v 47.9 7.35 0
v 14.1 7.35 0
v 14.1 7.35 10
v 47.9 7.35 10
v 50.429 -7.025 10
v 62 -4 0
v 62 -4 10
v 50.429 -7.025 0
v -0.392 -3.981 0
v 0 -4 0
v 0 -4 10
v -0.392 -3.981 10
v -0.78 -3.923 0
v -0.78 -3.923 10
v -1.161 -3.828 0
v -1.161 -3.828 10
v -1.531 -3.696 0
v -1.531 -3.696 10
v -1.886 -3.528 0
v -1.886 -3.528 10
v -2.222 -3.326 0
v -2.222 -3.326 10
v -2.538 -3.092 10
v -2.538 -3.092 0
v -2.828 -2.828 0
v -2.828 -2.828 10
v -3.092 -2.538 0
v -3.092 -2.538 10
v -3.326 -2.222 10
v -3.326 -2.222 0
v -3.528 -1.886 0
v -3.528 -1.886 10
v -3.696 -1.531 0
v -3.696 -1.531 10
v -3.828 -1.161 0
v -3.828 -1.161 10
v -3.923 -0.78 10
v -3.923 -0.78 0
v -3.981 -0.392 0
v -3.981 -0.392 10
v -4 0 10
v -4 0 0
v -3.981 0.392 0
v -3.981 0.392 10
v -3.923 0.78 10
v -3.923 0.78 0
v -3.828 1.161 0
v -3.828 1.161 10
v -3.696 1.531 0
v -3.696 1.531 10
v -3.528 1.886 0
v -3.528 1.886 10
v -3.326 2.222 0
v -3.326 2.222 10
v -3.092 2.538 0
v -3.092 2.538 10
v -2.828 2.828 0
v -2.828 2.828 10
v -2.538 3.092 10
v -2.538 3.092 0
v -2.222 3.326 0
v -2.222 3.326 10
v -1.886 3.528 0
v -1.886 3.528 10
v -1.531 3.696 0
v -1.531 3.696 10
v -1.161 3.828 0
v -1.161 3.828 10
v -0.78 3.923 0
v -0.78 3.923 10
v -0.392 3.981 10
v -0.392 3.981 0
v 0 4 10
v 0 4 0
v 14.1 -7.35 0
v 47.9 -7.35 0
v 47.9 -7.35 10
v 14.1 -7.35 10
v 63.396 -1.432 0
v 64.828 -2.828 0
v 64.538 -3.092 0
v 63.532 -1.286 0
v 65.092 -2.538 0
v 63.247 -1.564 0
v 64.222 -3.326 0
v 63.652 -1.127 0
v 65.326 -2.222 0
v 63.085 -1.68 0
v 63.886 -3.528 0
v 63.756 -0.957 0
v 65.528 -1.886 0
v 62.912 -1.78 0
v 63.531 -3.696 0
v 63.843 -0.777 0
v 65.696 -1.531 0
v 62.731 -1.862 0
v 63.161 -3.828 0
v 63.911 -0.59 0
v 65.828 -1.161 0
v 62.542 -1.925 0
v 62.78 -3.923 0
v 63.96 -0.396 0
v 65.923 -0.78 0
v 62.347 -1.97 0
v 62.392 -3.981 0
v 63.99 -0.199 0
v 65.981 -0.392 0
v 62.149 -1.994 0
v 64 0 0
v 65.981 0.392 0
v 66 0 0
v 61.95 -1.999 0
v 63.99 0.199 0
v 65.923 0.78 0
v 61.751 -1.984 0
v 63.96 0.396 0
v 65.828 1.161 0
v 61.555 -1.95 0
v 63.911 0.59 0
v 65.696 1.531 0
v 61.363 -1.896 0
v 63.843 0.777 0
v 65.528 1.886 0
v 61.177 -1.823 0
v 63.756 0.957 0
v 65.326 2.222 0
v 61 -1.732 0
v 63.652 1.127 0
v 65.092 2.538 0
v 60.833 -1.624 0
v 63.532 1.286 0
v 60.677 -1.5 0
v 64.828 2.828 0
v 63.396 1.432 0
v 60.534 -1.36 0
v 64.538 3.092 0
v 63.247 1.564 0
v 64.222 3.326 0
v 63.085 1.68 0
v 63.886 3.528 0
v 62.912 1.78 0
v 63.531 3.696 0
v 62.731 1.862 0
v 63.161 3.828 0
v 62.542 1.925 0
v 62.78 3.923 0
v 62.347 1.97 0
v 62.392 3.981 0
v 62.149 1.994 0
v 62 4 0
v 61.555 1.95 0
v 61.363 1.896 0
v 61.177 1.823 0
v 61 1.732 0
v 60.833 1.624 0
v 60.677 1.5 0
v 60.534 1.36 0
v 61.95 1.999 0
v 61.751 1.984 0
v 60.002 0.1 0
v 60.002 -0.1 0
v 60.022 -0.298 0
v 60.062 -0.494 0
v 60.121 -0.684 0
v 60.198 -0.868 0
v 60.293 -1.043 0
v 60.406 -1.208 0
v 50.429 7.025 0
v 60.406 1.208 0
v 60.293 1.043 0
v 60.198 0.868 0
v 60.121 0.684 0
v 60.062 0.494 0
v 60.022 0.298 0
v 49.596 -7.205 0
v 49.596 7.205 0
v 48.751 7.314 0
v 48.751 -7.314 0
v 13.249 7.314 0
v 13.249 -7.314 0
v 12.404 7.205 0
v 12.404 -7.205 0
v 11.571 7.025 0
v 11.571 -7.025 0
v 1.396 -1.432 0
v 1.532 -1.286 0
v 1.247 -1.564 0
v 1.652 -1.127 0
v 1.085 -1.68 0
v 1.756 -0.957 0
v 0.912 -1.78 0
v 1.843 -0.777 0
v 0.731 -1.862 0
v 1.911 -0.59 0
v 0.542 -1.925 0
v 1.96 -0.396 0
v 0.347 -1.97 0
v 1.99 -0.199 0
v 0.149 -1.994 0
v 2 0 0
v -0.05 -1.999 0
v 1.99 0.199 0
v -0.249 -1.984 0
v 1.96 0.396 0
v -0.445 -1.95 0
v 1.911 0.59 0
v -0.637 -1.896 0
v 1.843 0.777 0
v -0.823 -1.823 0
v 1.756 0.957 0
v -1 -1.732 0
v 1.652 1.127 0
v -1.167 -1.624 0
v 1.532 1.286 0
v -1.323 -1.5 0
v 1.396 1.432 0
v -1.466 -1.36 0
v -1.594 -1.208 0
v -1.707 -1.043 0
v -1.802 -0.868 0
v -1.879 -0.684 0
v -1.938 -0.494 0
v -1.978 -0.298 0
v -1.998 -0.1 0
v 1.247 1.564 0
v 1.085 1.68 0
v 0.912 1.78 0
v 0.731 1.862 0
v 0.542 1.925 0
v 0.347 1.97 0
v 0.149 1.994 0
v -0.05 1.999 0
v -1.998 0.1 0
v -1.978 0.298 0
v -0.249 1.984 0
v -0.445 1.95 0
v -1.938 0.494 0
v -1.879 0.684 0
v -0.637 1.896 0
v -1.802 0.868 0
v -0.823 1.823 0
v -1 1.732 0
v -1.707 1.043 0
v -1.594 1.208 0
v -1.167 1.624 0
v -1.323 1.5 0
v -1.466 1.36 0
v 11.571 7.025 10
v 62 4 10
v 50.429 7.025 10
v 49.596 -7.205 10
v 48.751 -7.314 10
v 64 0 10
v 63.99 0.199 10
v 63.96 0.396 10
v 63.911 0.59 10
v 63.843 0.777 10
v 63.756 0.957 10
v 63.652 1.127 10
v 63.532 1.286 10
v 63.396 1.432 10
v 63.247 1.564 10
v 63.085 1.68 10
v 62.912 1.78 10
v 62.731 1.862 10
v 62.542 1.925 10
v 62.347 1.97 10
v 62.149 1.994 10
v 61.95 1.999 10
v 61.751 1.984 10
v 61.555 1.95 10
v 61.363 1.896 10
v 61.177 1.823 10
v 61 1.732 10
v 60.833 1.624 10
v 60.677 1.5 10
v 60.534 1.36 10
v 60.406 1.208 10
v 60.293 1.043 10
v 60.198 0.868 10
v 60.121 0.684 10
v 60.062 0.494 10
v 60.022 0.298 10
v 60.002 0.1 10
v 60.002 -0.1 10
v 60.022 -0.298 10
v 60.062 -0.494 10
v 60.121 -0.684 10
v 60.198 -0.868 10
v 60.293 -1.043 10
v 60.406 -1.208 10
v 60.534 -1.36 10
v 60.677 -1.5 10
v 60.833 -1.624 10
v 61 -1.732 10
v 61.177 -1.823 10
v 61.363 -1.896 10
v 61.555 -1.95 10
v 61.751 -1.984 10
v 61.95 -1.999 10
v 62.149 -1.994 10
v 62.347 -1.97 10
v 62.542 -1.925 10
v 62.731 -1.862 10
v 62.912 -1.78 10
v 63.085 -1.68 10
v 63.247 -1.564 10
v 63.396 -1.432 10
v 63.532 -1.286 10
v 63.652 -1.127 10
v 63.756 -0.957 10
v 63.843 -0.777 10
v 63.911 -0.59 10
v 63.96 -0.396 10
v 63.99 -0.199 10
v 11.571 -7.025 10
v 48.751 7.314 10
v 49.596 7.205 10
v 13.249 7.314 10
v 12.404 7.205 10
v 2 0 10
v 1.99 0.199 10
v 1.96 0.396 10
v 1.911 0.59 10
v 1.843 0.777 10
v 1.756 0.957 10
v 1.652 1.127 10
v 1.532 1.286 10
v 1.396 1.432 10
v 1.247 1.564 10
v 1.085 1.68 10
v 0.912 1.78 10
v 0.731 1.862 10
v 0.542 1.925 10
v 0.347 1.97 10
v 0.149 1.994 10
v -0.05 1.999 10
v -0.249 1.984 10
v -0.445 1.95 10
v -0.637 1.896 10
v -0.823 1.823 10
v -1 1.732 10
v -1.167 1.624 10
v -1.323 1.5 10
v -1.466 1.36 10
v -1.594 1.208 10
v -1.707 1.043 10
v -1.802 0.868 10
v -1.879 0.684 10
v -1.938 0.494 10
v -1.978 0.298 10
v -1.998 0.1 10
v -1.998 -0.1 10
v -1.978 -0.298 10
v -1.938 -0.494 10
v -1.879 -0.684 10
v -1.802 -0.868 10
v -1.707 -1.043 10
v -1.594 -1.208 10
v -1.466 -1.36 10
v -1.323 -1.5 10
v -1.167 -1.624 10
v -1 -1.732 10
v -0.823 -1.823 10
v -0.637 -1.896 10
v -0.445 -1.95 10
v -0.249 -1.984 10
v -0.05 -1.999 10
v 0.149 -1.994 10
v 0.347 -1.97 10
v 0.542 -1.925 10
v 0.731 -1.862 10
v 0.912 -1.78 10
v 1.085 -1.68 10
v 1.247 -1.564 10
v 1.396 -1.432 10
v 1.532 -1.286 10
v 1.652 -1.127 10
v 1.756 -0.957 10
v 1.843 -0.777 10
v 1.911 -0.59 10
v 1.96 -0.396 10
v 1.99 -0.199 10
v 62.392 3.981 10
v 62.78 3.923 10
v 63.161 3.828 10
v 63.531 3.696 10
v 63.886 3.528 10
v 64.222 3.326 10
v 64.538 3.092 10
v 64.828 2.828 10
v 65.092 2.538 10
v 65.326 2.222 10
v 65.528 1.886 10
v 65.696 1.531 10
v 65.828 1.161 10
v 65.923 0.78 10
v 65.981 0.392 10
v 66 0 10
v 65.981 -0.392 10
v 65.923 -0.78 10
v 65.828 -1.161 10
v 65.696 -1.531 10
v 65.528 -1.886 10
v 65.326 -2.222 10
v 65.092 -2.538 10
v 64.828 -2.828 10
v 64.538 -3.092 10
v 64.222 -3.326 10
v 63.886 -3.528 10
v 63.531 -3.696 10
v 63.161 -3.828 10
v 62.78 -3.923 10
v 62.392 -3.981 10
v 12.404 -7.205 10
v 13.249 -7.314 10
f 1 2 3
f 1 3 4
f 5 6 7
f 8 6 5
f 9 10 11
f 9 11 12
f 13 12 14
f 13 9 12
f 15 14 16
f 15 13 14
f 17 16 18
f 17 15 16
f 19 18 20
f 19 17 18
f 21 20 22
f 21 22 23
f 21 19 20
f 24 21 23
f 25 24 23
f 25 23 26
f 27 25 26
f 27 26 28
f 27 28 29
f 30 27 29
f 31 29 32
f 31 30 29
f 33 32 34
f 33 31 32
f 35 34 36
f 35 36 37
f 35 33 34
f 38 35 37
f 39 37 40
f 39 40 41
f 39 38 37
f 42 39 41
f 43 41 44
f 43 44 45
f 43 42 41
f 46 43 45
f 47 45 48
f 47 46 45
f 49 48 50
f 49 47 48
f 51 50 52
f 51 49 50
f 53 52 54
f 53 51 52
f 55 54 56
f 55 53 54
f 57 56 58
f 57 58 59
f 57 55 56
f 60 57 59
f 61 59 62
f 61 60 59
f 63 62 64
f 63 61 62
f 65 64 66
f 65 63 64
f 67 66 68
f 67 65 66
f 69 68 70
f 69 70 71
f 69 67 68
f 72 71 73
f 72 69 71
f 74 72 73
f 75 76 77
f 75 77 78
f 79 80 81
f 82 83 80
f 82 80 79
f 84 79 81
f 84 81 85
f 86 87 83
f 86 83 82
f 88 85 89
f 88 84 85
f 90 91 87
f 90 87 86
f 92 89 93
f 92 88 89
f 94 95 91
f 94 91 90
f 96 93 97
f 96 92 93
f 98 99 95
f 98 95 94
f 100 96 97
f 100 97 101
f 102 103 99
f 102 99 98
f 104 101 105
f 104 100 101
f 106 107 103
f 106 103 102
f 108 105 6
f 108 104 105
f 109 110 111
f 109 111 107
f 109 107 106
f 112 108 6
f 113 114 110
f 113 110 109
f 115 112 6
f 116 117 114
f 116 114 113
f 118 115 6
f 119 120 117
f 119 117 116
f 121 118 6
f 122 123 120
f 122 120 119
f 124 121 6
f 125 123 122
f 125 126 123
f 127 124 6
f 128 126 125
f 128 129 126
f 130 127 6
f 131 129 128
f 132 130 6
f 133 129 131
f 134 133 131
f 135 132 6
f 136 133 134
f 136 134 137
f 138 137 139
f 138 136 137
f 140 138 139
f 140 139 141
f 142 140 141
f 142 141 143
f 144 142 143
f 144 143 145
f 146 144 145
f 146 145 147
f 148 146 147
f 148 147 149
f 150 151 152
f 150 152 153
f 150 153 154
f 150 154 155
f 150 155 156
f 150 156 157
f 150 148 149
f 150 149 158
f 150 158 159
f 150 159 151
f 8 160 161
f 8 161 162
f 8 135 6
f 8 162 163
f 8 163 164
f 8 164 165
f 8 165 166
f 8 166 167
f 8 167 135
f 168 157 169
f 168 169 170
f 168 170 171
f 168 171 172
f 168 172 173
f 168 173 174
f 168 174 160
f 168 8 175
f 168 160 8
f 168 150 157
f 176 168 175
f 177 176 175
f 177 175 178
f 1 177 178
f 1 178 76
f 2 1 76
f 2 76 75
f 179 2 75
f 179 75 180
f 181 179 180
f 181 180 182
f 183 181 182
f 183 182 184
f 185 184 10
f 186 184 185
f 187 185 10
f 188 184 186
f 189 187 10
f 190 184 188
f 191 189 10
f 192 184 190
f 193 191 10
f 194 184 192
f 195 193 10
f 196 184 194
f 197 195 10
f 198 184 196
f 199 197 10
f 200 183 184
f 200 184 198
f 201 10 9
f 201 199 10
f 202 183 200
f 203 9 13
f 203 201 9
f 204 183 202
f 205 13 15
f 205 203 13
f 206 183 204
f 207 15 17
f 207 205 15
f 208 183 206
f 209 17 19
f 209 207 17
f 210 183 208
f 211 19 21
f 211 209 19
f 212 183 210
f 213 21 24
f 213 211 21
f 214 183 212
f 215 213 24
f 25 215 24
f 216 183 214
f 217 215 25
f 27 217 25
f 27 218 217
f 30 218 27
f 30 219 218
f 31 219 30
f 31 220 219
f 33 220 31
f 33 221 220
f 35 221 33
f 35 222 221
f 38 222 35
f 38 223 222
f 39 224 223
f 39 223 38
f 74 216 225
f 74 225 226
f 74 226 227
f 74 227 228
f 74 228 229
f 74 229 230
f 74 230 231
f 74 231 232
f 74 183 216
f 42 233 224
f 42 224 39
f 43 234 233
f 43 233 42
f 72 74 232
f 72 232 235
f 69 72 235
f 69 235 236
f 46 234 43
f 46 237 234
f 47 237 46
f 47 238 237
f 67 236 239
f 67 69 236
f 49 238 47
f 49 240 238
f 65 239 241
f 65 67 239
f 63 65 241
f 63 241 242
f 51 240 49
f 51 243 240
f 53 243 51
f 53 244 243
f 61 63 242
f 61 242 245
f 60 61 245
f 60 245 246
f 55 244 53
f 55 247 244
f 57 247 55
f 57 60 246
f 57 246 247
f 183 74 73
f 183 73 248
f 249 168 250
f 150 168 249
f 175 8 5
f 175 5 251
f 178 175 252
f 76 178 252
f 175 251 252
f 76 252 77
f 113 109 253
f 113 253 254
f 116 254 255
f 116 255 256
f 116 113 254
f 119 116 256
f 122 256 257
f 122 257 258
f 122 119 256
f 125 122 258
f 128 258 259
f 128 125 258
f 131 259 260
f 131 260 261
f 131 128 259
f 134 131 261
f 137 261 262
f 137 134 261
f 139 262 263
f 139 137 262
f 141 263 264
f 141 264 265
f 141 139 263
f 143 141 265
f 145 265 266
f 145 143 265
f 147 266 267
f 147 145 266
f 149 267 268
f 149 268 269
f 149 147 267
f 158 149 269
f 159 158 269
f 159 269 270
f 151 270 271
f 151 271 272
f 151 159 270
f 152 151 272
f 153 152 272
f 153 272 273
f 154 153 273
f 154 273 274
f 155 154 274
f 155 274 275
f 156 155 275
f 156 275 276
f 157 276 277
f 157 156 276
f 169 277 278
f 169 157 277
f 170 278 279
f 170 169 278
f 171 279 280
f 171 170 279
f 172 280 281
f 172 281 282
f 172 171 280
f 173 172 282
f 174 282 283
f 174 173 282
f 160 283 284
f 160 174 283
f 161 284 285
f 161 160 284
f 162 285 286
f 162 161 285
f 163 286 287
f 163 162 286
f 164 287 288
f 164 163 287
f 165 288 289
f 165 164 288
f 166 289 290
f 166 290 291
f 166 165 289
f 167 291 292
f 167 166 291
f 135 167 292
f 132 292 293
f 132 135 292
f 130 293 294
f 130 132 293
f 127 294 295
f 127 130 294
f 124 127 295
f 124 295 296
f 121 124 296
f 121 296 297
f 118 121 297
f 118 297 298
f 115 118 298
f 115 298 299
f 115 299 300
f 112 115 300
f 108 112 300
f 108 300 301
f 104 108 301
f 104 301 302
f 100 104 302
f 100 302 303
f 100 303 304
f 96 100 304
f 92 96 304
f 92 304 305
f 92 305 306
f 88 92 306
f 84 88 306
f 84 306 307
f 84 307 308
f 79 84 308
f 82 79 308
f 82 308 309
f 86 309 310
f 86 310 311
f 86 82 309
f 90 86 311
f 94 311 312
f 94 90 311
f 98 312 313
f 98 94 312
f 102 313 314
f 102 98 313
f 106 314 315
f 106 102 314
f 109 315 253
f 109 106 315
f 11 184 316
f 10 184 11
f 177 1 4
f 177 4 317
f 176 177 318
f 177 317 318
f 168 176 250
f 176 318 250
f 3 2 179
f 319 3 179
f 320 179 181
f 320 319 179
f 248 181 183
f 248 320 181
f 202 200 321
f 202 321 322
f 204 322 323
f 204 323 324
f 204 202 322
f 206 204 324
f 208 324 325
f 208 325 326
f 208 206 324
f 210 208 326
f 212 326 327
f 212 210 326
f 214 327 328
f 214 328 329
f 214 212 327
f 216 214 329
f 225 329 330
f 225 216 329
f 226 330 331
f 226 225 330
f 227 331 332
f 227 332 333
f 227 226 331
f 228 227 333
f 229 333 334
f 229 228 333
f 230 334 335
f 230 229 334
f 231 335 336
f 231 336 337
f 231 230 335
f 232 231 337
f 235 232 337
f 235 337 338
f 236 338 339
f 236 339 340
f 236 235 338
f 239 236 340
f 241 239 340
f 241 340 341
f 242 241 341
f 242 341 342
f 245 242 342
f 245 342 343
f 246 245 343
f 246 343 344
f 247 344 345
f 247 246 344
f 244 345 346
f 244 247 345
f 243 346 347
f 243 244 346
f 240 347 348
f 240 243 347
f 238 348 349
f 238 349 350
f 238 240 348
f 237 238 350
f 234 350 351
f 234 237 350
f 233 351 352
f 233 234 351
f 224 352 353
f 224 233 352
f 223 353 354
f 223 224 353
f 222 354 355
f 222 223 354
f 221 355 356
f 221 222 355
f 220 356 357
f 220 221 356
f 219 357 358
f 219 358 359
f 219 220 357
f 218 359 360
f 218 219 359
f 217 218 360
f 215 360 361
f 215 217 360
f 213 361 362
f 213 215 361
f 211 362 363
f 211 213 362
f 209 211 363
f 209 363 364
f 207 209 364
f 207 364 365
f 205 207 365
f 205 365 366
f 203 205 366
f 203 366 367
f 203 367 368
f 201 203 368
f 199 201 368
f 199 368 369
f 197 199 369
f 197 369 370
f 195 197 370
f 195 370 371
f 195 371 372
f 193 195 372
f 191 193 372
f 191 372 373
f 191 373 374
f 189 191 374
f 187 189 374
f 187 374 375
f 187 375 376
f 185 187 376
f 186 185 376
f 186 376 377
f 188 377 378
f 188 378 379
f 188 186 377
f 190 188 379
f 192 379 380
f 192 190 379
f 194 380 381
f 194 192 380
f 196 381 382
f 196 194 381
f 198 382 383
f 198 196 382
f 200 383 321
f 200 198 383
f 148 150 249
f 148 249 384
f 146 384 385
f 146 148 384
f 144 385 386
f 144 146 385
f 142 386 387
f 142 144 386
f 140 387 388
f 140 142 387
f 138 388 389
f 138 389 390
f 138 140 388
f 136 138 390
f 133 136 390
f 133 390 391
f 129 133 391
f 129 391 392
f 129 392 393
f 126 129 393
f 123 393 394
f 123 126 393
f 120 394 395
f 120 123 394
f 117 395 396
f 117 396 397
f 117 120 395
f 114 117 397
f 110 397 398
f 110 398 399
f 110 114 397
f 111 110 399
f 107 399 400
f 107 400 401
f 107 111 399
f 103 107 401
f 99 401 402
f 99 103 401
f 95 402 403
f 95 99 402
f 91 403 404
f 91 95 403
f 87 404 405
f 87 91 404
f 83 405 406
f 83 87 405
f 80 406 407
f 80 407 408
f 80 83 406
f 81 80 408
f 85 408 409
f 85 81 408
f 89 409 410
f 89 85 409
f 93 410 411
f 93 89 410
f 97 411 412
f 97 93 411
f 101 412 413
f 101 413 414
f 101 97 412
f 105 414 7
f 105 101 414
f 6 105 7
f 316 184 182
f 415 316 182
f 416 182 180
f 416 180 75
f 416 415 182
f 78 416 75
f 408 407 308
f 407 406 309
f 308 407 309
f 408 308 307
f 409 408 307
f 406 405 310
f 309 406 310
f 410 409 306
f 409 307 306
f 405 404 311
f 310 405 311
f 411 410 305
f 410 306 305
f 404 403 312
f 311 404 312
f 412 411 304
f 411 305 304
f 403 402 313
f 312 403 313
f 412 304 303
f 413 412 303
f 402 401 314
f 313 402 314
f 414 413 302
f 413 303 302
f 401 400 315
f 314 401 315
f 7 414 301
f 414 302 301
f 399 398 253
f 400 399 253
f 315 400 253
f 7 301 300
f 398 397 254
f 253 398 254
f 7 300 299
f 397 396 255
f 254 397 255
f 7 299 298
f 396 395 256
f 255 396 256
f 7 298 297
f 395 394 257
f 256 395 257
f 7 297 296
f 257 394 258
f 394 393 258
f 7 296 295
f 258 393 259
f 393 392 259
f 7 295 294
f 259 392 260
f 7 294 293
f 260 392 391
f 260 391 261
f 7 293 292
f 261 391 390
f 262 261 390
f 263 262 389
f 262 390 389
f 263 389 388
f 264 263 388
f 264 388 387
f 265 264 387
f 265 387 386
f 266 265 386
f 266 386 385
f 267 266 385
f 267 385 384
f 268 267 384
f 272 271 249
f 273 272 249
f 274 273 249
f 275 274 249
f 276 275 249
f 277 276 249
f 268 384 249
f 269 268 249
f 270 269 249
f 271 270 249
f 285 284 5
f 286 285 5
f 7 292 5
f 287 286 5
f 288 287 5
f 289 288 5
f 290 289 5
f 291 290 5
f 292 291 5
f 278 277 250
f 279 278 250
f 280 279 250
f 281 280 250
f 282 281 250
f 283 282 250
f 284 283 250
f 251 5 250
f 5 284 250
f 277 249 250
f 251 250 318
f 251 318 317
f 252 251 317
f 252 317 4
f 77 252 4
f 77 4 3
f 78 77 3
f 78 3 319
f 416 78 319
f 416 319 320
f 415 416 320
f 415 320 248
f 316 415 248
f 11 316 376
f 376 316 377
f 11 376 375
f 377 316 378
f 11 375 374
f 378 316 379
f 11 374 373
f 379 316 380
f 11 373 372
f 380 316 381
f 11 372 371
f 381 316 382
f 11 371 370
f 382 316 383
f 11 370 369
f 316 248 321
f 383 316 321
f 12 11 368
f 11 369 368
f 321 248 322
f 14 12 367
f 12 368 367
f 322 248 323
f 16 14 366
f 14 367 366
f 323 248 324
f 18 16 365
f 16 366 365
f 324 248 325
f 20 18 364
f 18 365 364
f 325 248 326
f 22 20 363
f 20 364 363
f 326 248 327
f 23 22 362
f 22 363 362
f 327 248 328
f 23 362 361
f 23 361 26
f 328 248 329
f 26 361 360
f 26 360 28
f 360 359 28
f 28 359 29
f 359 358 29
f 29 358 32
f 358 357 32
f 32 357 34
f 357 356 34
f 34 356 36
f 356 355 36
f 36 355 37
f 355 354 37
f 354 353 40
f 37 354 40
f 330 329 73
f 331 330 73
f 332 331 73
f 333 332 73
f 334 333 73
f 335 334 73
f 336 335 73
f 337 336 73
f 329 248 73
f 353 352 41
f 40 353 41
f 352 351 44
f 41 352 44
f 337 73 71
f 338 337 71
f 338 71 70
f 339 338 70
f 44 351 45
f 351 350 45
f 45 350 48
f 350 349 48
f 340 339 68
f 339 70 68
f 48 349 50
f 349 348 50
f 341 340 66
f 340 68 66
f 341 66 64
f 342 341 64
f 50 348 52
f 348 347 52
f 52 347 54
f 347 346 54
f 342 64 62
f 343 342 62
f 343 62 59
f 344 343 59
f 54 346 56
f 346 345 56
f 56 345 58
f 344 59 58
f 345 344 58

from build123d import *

# Parameters (mm, degrees)
CROQUIS1_R              = 2
SALIENTE_EXTRUIR1_DEPTH = 10
REDONDEO2_R             = 10


with BuildPart() as part:
    # Croquis1 → Saliente-Extruir1 (new body)
    with BuildSketch(Plane.XY):
        with BuildLine():
            Line((12.815, 7.35), (49.185, 7.35))
            Line((49.185, 7.35), (62, 4))
            ThreePointArc((62, 4), (66, 0), (62, -4))
            Line((62, -4), (49.185, -7.35))
            Line((49.185, -7.35), (12.815, -7.35))
            Line((12.815, -7.35), (0, -4))
            ThreePointArc((0, -4), (-4, 0), (0, 4))
            Line((0, 4), (12.815, 7.35))
        make_face()
        Circle(CROQUIS1_R, mode=Mode.SUBTRACT)
        with Locations((62, 0)):
            Circle(CROQUIS1_R, mode=Mode.SUBTRACT)
    extrude(amount=SALIENTE_EXTRUIR1_DEPTH)

    # Redondeo2
    redondeo2_edges = [part.edges().sort_by_distance(p)[0] for p in [
        (12.815, 7.35, 5),
        (49.185, 7.35, 5),
        (49.185, -7.35, 5),
        (12.815, -7.35, 5),
    ]]
    fillet(redondeo2_edges, radius=REDONDEO2_R)


solid = part.part
